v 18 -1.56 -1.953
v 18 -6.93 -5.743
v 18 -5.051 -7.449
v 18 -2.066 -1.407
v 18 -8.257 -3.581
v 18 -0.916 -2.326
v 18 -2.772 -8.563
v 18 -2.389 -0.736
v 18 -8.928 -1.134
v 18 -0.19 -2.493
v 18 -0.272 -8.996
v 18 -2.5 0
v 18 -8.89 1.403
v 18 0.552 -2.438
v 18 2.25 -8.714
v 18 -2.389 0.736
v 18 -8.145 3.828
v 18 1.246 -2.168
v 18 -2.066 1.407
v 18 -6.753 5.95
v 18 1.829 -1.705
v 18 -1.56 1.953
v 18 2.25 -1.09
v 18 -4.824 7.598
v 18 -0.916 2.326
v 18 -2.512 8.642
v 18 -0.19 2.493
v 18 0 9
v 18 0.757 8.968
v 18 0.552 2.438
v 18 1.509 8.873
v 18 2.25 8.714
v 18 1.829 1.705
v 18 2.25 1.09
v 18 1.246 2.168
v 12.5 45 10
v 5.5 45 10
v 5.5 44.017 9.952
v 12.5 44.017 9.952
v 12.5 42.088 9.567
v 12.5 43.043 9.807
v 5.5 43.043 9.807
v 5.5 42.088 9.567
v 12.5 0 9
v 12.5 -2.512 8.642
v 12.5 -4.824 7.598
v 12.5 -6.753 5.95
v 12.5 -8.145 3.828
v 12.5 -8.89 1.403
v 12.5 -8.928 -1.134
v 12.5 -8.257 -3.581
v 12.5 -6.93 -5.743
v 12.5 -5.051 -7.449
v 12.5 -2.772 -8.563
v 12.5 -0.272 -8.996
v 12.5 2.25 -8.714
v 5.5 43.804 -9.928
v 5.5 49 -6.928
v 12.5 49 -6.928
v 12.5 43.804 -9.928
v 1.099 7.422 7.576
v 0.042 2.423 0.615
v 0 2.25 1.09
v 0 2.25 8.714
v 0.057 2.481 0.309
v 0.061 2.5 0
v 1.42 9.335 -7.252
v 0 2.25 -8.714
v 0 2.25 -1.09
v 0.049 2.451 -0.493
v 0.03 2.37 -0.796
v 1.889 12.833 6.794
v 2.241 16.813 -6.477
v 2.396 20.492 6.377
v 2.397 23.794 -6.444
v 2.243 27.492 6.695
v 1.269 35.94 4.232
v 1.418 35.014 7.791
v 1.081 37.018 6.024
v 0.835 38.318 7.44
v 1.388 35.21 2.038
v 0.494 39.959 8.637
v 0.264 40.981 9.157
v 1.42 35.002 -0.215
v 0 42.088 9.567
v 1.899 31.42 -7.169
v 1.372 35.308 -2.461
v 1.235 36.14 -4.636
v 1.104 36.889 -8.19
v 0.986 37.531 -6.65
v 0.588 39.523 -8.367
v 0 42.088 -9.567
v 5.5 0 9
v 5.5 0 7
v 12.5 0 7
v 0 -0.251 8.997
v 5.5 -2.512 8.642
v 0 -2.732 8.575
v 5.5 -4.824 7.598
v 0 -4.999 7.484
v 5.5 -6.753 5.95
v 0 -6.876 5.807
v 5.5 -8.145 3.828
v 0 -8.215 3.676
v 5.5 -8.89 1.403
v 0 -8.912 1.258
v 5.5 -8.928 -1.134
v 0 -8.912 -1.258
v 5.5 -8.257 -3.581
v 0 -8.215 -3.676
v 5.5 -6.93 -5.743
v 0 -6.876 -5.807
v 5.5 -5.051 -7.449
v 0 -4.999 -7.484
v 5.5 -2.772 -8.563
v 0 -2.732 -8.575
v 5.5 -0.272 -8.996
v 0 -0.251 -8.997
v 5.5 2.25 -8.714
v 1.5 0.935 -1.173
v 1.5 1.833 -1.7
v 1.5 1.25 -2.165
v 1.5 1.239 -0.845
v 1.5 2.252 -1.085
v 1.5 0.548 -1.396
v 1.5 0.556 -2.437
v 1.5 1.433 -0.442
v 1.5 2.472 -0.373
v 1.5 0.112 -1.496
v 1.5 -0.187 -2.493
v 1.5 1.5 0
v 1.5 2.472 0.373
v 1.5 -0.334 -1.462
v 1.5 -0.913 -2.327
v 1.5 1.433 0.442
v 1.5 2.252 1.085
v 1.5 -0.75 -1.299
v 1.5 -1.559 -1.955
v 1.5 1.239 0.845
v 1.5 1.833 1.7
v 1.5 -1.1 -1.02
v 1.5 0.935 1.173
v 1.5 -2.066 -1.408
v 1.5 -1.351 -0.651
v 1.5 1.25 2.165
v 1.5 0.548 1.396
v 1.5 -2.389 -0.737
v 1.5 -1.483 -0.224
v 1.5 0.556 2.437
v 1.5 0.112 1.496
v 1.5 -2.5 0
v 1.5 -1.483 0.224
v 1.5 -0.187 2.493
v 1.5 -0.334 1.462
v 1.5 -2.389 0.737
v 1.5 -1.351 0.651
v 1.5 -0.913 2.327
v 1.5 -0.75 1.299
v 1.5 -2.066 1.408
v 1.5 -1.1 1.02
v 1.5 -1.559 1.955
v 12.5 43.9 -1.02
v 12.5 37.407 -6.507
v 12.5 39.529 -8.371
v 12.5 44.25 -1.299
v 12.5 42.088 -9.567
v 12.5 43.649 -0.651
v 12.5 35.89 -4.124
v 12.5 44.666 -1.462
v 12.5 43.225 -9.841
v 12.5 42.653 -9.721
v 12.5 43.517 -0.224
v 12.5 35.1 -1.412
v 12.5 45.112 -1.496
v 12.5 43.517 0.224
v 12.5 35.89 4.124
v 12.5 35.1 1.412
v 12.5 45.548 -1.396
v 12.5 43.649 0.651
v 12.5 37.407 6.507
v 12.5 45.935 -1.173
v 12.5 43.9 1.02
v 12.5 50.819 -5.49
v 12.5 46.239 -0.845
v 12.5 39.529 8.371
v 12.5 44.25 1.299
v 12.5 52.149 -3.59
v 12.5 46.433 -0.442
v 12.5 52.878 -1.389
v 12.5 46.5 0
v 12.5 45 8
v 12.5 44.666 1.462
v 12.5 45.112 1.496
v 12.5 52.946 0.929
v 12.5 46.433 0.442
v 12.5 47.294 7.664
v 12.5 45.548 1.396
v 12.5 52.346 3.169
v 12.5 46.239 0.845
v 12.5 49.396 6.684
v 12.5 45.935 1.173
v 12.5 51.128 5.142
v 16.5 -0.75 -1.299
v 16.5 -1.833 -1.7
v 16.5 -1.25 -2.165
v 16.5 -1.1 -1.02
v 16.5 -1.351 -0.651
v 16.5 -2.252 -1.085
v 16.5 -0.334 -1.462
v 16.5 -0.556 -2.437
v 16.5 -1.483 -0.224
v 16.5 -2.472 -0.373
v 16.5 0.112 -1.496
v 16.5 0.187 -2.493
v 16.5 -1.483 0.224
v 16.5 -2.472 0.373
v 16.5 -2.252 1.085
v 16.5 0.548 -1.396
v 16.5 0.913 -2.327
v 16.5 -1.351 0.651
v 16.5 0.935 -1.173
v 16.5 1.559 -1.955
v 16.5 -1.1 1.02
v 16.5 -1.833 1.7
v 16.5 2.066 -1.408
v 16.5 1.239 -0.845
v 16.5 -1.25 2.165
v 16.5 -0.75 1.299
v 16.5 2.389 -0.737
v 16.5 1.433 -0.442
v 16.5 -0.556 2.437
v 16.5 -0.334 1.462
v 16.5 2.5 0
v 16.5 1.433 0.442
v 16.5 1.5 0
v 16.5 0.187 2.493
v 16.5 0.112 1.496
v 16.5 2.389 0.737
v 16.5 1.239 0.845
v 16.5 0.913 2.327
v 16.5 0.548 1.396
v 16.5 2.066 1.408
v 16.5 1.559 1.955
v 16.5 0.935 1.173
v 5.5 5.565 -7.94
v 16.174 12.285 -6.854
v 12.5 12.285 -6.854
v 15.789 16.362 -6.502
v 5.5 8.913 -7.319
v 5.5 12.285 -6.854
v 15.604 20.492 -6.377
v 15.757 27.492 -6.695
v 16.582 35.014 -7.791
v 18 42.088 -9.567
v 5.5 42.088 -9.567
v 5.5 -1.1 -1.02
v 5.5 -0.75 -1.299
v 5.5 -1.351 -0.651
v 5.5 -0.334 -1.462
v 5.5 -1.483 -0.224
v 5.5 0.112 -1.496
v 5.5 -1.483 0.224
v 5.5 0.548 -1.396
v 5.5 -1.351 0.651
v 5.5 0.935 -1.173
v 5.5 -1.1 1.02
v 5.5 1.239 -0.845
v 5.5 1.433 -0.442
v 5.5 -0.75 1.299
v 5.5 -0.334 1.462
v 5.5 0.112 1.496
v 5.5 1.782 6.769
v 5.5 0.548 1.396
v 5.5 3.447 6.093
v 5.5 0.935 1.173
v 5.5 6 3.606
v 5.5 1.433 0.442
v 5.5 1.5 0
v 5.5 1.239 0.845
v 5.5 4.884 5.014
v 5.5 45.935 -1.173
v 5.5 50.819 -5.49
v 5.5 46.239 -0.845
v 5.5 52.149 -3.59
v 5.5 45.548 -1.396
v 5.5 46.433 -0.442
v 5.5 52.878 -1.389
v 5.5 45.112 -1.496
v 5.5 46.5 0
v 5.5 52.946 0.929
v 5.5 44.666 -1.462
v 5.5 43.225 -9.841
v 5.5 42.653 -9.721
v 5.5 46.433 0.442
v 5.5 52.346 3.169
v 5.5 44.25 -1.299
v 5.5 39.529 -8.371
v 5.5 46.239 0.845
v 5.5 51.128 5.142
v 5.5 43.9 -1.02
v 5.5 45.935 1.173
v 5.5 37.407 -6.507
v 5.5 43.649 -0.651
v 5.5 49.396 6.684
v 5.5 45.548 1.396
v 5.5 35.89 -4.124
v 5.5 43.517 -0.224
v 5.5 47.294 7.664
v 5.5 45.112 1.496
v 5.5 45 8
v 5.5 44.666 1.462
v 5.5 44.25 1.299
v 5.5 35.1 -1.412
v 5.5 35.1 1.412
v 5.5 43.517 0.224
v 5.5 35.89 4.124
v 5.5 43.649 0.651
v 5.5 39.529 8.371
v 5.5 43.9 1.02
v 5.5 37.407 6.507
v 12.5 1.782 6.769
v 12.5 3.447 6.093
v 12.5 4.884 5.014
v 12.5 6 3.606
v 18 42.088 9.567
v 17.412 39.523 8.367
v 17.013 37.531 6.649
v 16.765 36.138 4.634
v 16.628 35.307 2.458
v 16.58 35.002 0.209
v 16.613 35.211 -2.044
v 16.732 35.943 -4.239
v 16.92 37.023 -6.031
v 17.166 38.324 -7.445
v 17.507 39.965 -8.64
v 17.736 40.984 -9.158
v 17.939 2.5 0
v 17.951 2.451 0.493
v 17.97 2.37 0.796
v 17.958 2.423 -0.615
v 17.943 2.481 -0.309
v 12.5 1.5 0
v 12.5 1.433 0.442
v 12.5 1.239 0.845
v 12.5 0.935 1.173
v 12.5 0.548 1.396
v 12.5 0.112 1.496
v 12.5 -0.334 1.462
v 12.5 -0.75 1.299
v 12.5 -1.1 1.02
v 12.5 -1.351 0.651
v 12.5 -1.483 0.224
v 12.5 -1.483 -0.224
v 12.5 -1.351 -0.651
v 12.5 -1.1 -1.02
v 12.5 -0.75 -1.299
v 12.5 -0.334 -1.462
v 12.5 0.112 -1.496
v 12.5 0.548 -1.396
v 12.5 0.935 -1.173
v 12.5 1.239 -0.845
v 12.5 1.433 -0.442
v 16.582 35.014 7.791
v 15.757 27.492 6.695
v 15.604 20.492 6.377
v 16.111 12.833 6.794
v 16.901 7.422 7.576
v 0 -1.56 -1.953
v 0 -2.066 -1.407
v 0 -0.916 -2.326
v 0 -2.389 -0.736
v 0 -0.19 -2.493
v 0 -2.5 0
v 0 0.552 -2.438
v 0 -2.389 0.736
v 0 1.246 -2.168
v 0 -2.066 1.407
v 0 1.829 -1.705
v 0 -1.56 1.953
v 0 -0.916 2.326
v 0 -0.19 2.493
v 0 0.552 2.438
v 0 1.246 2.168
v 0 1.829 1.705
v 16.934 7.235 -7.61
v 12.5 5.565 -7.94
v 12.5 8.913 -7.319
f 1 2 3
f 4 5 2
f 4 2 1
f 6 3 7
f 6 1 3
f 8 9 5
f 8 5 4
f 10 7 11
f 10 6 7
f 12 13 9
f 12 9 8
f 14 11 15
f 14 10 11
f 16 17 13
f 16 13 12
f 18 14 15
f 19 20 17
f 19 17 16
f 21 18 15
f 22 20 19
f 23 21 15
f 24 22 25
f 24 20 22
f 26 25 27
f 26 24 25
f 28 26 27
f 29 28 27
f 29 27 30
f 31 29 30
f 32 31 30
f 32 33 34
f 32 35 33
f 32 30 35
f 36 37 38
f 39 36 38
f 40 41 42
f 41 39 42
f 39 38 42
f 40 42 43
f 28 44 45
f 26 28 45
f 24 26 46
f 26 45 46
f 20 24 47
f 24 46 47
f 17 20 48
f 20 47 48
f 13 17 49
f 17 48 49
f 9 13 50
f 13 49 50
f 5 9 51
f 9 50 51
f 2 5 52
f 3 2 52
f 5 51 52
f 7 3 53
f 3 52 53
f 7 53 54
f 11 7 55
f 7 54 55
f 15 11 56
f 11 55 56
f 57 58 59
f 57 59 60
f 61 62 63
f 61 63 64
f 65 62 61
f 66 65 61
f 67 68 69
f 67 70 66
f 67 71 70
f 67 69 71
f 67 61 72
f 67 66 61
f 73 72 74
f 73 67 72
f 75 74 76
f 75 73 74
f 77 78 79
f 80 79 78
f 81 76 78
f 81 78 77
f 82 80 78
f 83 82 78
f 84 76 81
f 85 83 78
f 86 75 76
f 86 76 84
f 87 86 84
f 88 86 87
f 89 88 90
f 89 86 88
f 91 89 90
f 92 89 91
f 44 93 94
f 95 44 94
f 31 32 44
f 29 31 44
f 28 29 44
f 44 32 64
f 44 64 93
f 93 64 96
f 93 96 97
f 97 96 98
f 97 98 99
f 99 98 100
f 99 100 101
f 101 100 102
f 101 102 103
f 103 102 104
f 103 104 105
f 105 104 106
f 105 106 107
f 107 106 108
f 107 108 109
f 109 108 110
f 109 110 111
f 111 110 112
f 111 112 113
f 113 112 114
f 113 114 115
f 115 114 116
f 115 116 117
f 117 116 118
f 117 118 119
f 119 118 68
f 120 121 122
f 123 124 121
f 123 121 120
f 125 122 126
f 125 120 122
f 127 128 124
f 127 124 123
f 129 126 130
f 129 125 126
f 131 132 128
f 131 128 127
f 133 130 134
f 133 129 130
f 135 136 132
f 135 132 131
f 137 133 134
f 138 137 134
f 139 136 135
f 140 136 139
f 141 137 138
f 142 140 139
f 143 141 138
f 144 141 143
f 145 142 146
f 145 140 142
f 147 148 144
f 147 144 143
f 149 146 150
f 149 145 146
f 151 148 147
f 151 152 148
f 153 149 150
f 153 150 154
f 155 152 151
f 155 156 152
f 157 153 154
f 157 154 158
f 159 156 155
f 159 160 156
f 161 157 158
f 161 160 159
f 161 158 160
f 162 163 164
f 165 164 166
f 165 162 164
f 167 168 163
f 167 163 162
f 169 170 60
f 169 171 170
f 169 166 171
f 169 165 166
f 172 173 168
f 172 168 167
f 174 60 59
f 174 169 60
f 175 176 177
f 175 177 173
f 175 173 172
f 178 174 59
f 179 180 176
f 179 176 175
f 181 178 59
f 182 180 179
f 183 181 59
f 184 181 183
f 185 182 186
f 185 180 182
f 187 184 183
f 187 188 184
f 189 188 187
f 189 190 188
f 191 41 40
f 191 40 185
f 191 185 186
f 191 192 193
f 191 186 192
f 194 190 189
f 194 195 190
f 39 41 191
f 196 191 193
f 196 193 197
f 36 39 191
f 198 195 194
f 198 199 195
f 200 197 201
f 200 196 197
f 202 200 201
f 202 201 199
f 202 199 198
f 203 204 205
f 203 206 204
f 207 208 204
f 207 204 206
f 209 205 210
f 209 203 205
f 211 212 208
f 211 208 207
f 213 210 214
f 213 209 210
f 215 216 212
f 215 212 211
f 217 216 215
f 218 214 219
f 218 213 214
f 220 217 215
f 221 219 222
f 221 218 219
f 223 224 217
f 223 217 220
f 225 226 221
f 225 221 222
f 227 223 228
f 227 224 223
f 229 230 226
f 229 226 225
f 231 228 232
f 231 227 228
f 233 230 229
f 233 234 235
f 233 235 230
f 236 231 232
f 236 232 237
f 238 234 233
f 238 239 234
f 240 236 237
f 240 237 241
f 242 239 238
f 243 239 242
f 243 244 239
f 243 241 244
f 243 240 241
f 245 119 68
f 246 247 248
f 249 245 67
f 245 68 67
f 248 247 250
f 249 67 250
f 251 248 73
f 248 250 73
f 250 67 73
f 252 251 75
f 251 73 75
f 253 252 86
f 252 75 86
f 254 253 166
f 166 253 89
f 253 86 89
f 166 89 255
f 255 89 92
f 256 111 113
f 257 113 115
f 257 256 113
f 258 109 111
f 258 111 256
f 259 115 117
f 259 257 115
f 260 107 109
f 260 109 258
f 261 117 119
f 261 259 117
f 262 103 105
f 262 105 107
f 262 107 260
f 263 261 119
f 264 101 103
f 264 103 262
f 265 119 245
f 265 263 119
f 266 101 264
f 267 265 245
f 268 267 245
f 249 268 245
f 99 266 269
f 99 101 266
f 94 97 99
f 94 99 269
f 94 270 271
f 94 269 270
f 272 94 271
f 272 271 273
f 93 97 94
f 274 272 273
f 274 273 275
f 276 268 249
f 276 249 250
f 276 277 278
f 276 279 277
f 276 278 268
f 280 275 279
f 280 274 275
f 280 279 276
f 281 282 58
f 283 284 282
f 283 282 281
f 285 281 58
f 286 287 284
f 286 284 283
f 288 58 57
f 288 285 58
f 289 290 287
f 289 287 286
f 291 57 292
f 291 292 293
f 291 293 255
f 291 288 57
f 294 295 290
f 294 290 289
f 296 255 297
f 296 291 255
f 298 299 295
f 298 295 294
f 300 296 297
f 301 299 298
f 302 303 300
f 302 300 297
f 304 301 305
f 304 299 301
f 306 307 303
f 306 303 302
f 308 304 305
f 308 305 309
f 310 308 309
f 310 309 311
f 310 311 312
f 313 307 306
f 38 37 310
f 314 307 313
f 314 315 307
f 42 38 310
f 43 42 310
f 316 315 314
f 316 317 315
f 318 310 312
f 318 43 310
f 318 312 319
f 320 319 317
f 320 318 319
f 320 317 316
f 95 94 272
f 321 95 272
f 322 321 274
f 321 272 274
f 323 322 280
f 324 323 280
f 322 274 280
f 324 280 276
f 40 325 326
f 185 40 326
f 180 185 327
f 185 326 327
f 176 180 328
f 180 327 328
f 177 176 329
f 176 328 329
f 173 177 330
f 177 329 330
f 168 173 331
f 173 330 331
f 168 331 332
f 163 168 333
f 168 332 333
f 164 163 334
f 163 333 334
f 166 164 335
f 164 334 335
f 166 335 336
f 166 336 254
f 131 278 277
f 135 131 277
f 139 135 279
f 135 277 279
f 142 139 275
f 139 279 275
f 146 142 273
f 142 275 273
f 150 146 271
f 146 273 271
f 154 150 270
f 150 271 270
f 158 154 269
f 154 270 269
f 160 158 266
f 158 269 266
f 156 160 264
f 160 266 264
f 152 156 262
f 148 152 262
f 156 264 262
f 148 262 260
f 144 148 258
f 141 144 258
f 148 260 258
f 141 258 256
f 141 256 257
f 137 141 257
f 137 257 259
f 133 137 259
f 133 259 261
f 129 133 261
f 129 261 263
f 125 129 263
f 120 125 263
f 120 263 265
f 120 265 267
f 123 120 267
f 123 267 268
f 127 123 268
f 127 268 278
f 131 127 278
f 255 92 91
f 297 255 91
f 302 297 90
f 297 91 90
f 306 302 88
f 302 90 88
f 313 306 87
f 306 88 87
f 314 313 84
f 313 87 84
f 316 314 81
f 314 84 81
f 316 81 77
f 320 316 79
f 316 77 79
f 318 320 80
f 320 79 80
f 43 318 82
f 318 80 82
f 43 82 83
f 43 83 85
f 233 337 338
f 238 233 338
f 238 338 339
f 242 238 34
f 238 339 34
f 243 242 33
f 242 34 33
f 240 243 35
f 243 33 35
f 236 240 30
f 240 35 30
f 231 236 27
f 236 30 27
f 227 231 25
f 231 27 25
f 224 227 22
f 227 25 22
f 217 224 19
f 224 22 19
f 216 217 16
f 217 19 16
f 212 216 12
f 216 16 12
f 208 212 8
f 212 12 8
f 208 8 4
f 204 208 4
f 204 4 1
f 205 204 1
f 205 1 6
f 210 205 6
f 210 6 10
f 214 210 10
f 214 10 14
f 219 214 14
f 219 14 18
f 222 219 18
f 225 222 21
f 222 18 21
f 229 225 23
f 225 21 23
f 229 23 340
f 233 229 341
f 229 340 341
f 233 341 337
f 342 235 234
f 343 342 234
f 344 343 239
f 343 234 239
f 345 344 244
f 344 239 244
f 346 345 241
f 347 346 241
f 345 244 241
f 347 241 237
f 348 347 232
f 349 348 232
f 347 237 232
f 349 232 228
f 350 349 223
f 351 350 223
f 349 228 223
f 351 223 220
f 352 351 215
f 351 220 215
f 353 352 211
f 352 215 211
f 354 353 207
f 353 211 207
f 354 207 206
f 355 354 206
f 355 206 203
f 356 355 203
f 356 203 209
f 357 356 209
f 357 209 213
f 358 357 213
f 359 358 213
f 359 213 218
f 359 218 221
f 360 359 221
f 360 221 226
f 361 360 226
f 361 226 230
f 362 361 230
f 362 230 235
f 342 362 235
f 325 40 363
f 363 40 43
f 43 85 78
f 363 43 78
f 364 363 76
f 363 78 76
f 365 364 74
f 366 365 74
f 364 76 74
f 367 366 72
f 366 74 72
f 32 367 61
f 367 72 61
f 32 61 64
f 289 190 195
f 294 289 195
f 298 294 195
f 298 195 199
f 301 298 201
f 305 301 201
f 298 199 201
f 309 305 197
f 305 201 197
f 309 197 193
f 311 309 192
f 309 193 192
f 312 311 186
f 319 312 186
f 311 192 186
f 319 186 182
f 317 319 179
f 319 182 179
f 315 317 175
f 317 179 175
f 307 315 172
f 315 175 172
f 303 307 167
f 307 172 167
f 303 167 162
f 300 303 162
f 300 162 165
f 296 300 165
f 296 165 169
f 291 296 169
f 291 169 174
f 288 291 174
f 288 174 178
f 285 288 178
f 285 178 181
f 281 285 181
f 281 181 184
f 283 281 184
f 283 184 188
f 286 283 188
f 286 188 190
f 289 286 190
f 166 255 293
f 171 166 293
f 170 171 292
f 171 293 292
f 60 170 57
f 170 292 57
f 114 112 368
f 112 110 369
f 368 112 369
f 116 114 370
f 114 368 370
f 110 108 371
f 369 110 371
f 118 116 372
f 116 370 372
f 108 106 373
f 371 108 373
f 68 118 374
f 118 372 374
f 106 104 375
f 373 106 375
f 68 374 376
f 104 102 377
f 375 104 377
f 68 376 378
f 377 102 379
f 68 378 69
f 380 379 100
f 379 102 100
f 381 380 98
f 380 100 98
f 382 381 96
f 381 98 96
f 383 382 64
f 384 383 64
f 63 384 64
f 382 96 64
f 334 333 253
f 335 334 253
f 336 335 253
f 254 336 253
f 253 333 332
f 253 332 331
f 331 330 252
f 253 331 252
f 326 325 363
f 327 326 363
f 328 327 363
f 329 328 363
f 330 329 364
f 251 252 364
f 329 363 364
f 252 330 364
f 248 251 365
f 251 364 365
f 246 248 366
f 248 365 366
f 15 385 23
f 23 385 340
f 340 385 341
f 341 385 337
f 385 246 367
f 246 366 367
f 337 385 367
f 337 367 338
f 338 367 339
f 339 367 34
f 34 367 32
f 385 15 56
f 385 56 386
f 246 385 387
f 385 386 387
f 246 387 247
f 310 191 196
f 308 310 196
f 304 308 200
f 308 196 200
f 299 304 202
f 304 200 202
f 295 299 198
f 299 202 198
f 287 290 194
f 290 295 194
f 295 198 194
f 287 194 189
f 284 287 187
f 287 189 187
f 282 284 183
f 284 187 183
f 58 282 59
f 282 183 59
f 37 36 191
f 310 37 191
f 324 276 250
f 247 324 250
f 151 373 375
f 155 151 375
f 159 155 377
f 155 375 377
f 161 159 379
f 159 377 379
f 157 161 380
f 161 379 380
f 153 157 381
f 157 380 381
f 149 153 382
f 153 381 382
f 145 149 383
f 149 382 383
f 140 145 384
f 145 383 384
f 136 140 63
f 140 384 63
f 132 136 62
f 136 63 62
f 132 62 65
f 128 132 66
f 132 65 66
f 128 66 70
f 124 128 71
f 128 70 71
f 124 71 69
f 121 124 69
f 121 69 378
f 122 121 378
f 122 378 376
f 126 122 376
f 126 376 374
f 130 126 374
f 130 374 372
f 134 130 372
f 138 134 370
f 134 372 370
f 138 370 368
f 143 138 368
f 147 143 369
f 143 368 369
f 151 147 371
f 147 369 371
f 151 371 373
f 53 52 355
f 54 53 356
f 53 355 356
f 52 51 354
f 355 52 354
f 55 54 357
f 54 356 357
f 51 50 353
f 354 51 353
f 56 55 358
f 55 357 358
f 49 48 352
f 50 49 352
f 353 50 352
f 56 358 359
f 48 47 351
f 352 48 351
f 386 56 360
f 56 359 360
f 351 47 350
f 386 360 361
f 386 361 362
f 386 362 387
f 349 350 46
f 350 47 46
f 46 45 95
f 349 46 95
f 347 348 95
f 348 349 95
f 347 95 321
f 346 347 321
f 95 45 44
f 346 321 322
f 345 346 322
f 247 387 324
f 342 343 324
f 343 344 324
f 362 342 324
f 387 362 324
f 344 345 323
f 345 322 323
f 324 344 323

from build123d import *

# Parameters (mm, degrees)
F1_DEPTH  = 5.5
F3_DEPTH  = 7
F5_DEPTH  = 5.5
F6_R      = 10
F7_DEPTH  = 5.5
F8_R      = 10
F9_DEPTH  = 5.5
F11_DEPTH = 12.501
F12_R     = 1.5
F13_DEPTH = 18.001
F14_R     = 2.5
F15_DEPTH = 1.5
F16_R     = 2.5
F17_DEPTH = 1.5
F18_R     = 83.4133197042
F19_DEPTH = 12.5


with BuildPart() as f1:
    # F0 (on Right) → F1 (new body)
    with BuildSketch(Plane.YZ):
        with BuildLine():
            ThreePointArc((42.0884551059, 9.566760493), (22.2278404433, 6.393975856), (2.2496848399, 8.7142938969))
            ThreePointArc((2.2496848399, 8.7142938969), (-9, 0), (2.2496848399, -8.7142938969))
            ThreePointArc((2.2496848399, -8.7142938969), (22.2278404433, -6.393975856), (42.0884551059, -9.566760493))
            ThreePointArc((42.0884551059, -9.566760493), (55, 0), (42.0884551059, 9.566760493))
        make_face()
    extrude(amount=F1_DEPTH)

    # F2 (on face) → F3 (join)
    with BuildSketch(Plane.YZ.offset(5.5)):
        with BuildLine():
            ThreePointArc((42.0884551059, 9.566760493), (22.2278404433, 6.393975856), (2.2496848399, 8.7142938969))
            ThreePointArc((2.2496848399, 8.7142938969), (1.1338771821, 8.9282877718), (0, 9))
            Line((0, 9), (0, 7))
            ThreePointArc((0, 7), (3.4468203516, 6.0925716626), (6, 3.6055512755))
            Line((6, 3.6055512755), (12.2854984686, -6.8541504262))
            ThreePointArc((12.2854984686, -6.8541504262), (27.3262576199, -6.6802021184), (42.0884551059, -9.566760493))
            ThreePointArc((42.0884551059, -9.566760493), (55, 0), (42.0884551059, 9.566760493))
        make_face()
    extrude(amount=F3_DEPTH)

    # F4 (on face) → F5 (join)
    with BuildSketch(Plane.YZ.offset(12.5)):
        with BuildLine():
            ThreePointArc((2.2496848399, 8.7142938969), (1.1338771821, 8.9282877718), (0, 9))
            ThreePointArc((0, 9), (-8.9282877718, -1.1338771821), (2.2496848399, -8.7142938969))
            ThreePointArc((2.2496848399, -8.7142938969), (7.235317588, -7.610097682), (12.2854984686, -6.8541504262))
            ThreePointArc((12.2854984686, -6.8541504262), (27.3262576199, -6.6802021184), (42.0884551059, -9.566760493))
            ThreePointArc((42.0884551059, -9.566760493), (55, 0), (42.0884551059, 9.566760493))
            ThreePointArc((42.0884551059, 9.566760493), (22.2278404433, 6.393975856), (2.2496848399, 8.7142938969))
        make_face()
    extrude(amount=F5_DEPTH)

    # F6 (on face) → F7 (cut)
    with BuildSketch(Plane.YZ.offset(18)):
        with Locations((45, 0)):
            Circle(F6_R)
    extrude(amount=-F7_DEPTH, mode=Mode.SUBTRACT)

    # F8 (on face) → F9 (cut)
    with BuildSketch(Plane(origin=(0, 0, 0), x_dir=(0, -1, 0), z_dir=(-1, 0, 0))):
        with Locations((-45, 0)):
            Circle(F8_R)
    extrude(amount=-F9_DEPTH, mode=Mode.SUBTRACT)

    # F10 (on face) → F11 (cut, through all)
    with BuildSketch(Plane.YZ.offset(12.5)):
        with BuildLine():
            ThreePointArc((45, 8), (52.7274066103, 2.0705523608), (49, -6.9282032303))
            Line((49, -6.9282032303), (43.8038475773, -9.9282032303))
            ThreePointArc((43.8038475773, -9.9282032303), (54.9820346699, -0.5991526088), (45, 10))
            Line((45, 10), (45, 8))
        make_face()
    extrude(amount=-F11_DEPTH, mode=Mode.SUBTRACT)

    # F12 (on face) → F13 (cut, through all)
    with BuildSketch(Plane.YZ.offset(18)):
        Circle(F12_R)
        with Locations((45, 0)):
            Circle(F12_R)
    extrude(amount=-F13_DEPTH, mode=Mode.SUBTRACT)

    # F14 (on face) → F15 (cut)
    with BuildSketch(Plane.YZ.offset(18)):
        Circle(F14_R)
    extrude(amount=-F15_DEPTH, mode=Mode.SUBTRACT)

    # F16 (on face) → F17 (cut)
    with BuildSketch(Plane(origin=(0, 0, 0), x_dir=(0, -1, 0), z_dir=(-1, 0, 0))):
        Circle(F16_R)
    extrude(amount=-F17_DEPTH, mode=Mode.SUBTRACT)

    # F18 (on Top) → F19 (cut, symmetric)
    with BuildSketch(Plane.XY):
        with Locations((-81, 22.1690699729)):
            Circle(F18_R)
        with Locations((99, 22.1690699729)):
            Circle(F18_R)
    extrude(amount=F19_DEPTH, both=True, mode=Mode.SUBTRACT)


solid = f1.part
